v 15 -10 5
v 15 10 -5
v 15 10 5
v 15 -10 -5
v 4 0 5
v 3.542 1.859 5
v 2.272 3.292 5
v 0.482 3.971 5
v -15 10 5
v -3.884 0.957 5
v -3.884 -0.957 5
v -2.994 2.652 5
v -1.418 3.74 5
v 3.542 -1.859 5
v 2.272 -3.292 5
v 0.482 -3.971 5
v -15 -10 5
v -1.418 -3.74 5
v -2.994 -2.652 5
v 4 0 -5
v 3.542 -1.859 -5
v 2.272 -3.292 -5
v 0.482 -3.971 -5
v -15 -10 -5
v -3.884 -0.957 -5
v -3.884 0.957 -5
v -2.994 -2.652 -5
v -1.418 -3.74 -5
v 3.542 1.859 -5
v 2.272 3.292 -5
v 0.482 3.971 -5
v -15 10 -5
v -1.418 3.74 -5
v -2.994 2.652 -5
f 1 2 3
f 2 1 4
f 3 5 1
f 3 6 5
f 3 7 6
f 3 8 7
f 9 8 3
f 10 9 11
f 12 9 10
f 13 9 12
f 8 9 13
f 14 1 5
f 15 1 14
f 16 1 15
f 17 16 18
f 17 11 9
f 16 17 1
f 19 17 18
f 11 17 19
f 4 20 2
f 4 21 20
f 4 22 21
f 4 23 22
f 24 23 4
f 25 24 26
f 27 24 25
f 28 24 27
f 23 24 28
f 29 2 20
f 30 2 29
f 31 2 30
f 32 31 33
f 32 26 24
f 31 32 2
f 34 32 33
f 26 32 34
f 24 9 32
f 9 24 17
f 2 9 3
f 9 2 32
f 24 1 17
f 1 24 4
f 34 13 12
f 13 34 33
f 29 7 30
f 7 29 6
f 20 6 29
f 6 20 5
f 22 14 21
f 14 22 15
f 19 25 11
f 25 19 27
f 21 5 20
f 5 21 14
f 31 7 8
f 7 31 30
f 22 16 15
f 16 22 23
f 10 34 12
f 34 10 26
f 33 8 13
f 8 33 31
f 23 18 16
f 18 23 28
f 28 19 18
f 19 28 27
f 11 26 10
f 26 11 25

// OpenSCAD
difference() {
  cube([30, 20, 10], center = true);
  cylinder(h = 20, r = 4, center = true);
}
